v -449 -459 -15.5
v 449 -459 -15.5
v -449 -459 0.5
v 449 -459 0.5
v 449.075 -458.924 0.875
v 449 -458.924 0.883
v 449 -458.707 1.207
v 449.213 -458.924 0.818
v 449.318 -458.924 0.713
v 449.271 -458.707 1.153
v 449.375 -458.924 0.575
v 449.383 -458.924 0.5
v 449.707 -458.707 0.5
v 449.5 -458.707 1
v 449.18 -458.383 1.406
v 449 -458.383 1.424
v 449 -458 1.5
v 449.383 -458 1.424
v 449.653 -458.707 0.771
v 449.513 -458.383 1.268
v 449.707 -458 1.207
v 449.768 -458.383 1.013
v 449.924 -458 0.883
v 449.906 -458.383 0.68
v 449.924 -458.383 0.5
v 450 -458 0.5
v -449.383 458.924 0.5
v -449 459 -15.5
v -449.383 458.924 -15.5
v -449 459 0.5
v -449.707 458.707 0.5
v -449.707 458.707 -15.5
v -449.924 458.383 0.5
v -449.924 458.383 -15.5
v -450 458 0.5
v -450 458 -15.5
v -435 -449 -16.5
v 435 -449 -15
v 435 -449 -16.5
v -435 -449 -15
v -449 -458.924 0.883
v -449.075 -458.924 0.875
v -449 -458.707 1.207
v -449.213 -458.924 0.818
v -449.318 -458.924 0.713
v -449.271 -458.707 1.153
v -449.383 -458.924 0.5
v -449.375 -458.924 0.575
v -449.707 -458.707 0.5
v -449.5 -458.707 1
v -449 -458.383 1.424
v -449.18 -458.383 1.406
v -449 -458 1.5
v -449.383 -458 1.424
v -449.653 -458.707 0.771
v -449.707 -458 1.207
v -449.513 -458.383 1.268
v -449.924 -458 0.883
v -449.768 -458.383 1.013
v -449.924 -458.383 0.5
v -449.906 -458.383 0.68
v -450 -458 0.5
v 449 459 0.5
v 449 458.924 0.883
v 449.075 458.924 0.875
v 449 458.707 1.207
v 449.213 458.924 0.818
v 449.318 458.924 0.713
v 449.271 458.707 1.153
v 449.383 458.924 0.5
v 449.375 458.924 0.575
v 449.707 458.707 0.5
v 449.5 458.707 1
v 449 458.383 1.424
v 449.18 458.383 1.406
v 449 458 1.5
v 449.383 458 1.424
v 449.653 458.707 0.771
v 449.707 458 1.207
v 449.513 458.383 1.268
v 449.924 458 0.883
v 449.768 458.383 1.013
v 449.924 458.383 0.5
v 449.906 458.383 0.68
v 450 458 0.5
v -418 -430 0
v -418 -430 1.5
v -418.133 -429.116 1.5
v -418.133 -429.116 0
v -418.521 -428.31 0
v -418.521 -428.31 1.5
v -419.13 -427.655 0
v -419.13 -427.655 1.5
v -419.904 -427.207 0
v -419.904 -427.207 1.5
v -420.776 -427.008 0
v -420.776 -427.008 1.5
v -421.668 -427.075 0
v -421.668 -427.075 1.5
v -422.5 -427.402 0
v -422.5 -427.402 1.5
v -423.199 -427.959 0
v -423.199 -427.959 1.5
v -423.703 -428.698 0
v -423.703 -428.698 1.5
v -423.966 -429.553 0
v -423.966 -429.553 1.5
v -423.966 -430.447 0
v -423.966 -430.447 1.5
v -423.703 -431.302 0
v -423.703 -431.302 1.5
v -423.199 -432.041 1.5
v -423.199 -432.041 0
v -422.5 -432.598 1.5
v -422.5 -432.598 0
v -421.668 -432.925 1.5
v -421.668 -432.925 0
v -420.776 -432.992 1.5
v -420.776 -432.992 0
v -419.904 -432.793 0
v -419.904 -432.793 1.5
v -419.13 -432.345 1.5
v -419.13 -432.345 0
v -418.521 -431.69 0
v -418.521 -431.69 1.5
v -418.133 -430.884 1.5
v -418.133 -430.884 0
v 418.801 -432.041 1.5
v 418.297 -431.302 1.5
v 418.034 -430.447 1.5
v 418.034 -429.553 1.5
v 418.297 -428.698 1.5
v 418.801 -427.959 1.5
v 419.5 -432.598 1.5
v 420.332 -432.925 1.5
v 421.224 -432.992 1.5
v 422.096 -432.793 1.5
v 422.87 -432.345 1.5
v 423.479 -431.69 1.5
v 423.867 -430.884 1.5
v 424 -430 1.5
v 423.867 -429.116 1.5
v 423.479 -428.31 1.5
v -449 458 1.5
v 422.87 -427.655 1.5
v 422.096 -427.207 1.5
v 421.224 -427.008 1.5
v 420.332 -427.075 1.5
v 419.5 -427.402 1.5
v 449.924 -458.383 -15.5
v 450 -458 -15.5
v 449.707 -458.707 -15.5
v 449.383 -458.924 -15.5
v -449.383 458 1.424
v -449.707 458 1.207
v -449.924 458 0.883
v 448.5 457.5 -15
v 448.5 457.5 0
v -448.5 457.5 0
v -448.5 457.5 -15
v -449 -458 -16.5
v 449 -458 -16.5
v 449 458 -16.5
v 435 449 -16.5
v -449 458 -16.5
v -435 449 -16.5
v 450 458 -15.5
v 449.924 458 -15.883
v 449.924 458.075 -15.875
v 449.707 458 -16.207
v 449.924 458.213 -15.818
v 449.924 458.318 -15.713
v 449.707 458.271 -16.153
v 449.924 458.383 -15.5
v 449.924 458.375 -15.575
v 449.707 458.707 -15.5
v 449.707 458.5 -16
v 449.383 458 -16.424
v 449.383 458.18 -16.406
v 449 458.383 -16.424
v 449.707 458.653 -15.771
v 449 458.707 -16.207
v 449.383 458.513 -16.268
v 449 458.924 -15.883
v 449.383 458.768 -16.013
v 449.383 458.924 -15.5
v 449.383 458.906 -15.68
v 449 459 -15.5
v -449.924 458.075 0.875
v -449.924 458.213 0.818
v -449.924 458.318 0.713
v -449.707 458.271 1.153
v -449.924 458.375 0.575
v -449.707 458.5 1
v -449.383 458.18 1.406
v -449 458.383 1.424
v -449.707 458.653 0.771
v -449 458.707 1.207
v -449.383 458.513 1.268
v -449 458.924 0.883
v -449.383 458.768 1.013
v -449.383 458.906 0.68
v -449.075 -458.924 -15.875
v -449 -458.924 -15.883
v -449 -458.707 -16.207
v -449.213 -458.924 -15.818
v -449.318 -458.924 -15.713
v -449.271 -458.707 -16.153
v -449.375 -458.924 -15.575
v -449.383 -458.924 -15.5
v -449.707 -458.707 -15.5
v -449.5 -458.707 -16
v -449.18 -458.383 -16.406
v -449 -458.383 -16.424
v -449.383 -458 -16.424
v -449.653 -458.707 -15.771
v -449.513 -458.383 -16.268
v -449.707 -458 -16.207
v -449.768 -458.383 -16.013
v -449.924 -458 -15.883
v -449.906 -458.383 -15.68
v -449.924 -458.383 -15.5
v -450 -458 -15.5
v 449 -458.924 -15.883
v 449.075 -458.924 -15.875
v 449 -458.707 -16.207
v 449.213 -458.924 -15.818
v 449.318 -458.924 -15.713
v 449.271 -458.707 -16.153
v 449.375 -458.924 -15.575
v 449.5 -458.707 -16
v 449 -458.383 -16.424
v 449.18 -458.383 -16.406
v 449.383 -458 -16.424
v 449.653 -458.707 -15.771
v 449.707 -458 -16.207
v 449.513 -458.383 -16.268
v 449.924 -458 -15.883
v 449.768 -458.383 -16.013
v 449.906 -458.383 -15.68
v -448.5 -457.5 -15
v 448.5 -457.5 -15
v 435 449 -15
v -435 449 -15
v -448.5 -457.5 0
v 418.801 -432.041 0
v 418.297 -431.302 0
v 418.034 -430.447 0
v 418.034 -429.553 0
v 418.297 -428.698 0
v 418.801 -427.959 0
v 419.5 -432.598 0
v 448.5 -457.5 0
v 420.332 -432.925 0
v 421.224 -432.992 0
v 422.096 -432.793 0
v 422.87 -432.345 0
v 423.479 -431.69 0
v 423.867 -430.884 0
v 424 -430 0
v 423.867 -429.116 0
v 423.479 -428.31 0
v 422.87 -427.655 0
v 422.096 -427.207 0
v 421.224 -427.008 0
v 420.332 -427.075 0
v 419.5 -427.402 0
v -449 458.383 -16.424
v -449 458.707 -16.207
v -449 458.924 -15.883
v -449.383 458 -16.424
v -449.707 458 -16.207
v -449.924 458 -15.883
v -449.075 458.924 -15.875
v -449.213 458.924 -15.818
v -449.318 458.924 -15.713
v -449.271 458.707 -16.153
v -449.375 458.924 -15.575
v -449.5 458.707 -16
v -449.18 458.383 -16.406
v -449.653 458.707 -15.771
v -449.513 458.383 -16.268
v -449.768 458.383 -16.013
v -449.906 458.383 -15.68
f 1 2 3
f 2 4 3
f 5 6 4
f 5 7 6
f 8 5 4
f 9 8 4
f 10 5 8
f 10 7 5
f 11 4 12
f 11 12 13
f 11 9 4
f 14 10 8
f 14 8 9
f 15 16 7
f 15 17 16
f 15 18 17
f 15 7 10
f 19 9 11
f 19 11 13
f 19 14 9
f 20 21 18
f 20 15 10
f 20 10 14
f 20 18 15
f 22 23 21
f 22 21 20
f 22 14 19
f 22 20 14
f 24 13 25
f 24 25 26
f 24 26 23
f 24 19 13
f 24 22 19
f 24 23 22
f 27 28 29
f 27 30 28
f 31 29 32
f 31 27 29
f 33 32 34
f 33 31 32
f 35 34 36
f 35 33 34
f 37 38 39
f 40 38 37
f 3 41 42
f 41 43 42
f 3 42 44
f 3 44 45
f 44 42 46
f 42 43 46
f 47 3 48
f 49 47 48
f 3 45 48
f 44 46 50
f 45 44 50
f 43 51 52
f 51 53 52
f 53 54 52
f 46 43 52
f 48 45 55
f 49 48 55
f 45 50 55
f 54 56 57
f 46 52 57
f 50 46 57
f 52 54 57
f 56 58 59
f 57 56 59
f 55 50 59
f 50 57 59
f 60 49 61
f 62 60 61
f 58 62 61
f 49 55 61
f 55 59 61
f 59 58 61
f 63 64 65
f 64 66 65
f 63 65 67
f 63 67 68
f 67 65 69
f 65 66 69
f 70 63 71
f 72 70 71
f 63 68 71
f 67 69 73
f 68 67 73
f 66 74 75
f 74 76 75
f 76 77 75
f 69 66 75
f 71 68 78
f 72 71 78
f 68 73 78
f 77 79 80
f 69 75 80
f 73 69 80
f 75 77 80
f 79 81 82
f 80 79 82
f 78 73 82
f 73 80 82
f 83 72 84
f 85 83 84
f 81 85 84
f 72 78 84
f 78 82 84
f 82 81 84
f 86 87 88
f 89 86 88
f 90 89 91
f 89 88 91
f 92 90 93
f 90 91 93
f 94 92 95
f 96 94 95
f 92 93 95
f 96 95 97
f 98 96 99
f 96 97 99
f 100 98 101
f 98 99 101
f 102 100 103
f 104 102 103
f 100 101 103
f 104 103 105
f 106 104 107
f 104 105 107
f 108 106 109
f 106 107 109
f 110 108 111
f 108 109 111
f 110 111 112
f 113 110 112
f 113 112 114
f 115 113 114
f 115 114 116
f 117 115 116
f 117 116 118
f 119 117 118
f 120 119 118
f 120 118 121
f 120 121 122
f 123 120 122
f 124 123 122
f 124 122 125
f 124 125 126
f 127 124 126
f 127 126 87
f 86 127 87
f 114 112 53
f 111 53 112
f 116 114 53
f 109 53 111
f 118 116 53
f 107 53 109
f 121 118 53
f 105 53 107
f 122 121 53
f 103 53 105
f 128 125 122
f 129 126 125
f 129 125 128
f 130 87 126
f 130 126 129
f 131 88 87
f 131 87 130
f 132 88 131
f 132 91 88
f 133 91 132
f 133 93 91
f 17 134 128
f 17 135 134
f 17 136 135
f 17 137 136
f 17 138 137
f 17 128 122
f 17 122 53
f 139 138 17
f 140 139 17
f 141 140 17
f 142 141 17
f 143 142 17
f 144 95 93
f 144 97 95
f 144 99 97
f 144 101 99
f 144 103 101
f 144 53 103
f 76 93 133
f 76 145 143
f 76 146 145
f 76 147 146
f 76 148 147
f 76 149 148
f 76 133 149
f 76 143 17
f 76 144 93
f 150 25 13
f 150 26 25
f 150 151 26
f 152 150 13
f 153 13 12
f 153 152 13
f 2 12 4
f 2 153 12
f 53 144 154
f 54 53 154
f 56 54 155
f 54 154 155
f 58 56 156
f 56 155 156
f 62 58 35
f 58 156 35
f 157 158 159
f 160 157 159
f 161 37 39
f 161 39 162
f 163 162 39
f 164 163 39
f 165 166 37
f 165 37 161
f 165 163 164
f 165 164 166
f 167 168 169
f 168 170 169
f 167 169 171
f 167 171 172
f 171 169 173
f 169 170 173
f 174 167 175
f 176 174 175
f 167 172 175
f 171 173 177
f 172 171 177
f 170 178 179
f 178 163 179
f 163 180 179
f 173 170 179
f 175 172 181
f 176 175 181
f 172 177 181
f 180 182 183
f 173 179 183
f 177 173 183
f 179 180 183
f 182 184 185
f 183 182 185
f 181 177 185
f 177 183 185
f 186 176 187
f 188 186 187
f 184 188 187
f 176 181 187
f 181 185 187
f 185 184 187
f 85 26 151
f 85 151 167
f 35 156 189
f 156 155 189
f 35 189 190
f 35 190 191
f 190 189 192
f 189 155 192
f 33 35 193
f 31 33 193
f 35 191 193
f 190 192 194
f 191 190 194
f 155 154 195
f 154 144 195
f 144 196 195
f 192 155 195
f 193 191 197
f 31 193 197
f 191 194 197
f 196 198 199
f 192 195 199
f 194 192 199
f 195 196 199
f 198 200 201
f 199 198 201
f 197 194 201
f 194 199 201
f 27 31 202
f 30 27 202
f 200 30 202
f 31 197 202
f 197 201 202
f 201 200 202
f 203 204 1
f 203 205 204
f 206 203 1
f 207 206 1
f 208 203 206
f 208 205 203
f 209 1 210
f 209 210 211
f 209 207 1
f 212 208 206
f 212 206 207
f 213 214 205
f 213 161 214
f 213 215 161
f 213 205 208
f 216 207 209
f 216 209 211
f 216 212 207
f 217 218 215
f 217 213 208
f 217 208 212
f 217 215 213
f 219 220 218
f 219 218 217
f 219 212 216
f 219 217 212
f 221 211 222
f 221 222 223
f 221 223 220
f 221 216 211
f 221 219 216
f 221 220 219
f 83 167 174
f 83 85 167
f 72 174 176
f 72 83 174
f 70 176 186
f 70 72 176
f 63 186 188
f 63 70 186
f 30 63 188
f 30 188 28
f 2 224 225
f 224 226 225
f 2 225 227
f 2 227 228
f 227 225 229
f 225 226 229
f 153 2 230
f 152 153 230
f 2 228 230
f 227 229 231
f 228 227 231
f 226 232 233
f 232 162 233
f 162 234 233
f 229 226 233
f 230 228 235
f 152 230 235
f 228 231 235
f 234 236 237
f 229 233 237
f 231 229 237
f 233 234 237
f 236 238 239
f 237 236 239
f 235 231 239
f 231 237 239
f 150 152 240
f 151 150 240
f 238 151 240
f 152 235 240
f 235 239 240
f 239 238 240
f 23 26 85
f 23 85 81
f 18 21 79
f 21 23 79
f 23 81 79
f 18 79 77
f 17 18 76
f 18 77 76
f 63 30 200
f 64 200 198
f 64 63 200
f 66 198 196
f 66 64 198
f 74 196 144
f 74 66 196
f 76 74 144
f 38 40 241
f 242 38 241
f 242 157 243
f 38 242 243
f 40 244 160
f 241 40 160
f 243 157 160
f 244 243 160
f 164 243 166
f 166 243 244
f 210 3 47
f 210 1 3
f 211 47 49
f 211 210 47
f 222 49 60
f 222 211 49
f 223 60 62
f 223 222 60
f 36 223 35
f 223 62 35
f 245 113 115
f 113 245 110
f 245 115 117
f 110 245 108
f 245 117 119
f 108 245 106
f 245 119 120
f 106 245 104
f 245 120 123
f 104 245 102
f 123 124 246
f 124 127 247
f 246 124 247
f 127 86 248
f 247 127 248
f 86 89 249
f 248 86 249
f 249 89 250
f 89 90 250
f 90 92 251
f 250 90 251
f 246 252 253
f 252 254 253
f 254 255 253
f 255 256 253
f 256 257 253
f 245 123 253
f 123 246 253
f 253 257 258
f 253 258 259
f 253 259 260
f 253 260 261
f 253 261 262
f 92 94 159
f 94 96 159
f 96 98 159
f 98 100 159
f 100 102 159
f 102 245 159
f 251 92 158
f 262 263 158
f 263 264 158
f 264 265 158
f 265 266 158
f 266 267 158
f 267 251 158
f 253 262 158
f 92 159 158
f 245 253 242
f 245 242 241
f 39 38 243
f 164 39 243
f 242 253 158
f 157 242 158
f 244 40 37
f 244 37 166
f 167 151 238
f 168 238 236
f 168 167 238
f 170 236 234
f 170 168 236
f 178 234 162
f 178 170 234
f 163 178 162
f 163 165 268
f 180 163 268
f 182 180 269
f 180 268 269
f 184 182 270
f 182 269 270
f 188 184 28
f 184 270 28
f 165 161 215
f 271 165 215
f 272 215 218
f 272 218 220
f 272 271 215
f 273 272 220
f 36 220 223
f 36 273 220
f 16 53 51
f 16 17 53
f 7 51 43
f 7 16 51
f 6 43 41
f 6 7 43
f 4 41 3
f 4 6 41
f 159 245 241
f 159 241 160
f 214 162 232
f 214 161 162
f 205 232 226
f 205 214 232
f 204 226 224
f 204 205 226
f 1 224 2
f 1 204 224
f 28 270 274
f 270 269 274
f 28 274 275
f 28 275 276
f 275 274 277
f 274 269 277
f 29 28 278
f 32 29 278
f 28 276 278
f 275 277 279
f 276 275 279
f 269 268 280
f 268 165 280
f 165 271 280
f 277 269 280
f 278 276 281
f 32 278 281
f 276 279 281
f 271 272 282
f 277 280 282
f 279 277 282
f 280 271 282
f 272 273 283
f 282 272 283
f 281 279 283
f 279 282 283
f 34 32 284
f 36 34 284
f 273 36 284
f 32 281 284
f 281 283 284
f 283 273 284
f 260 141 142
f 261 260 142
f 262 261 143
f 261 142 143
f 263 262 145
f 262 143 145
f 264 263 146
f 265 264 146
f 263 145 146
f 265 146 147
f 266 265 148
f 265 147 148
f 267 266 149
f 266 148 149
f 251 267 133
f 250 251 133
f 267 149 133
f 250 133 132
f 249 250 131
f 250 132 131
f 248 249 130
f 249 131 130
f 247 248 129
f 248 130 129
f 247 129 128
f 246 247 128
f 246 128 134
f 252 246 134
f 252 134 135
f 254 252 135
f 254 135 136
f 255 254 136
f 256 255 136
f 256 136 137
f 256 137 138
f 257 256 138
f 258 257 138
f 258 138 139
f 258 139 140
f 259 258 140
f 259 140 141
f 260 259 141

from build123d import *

# Parameters (mm, degrees)
SKETCH_1_W          = 900
SKETCH_1_H          = 918
EXTRUDE_1_DEPTH     = 1.5
SKETCH_2_W          = 900
SKETCH_2_H          = 918
SKETCH_2_W_2        = 897
SKETCH_2_H_2        = 915
EXTRUDE_2_DEPTH     = 15
SKETCH_3_W          = 900
SKETCH_3_H          = 918
SKETCH_3_W_2        = 870
SKETCH_3_H_2        = 898
EXTRUDE_3_DEPTH     = 1.5
SKETCH_6_R          = 3
CUT_EXTRUDE_1_DEPTH = 19
FILLET_1_R          = 1


with BuildPart() as part:
    # 草图1 → 凸台-拉伸1 (new body)
    with BuildSketch(Plane.XY):
        Rectangle(SKETCH_1_W, SKETCH_1_H)
    extrude(amount=EXTRUDE_1_DEPTH)

    # 草图2 → 凸台-拉伸2 (add)
    with BuildSketch(Plane(origin=(0, 0, 0), x_dir=(-1, 0, 0), z_dir=(0, 0, -1))):
        Rectangle(SKETCH_2_W, SKETCH_2_H)
        Rectangle(SKETCH_2_W_2, SKETCH_2_H_2, mode=Mode.SUBTRACT)
    extrude(amount=EXTRUDE_2_DEPTH)

    # 草图3 → 凸台-拉伸3 (add)
    with BuildSketch(Plane(origin=(0, 0, -15), x_dir=(-1, 0, 0), z_dir=(0, 0, -1))):
        Rectangle(SKETCH_3_W, SKETCH_3_H)
        Rectangle(SKETCH_3_W_2, SKETCH_3_H_2, mode=Mode.SUBTRACT)
    extrude(amount=EXTRUDE_3_DEPTH)

    # 草图6 → 切除-拉伸1 (cut, through all)
    with BuildSketch(Plane.XY.offset(1.5)):
        with Locations((-421, -430)):
            Circle(SKETCH_6_R)
        with Locations((421, -430)):
            Circle(SKETCH_6_R)
    extrude(amount=-CUT_EXTRUDE_1_DEPTH, mode=Mode.SUBTRACT)

    # 圆角1
    fillet_1_edges = [part.edges().sort_by_distance(p)[0] for p in [
        (450, 0, 1.5),
        (0, 459, 1.5),
        (-450, 0, -16.5),
        (0, 459, -16.5),
        (450, 0, -16.5),
        (0, -459, -16.5),
        (-450, 0, 1.5),
        (0, -459, 1.5),
        (-450, 459, -7.5),
        (450, 459, -7.5),
        (450, -459, -7.5),
        (-450, -459, -7.5),
    ]]
    fillet(fillet_1_edges, radius=FILLET_1_R)


solid = part.part
